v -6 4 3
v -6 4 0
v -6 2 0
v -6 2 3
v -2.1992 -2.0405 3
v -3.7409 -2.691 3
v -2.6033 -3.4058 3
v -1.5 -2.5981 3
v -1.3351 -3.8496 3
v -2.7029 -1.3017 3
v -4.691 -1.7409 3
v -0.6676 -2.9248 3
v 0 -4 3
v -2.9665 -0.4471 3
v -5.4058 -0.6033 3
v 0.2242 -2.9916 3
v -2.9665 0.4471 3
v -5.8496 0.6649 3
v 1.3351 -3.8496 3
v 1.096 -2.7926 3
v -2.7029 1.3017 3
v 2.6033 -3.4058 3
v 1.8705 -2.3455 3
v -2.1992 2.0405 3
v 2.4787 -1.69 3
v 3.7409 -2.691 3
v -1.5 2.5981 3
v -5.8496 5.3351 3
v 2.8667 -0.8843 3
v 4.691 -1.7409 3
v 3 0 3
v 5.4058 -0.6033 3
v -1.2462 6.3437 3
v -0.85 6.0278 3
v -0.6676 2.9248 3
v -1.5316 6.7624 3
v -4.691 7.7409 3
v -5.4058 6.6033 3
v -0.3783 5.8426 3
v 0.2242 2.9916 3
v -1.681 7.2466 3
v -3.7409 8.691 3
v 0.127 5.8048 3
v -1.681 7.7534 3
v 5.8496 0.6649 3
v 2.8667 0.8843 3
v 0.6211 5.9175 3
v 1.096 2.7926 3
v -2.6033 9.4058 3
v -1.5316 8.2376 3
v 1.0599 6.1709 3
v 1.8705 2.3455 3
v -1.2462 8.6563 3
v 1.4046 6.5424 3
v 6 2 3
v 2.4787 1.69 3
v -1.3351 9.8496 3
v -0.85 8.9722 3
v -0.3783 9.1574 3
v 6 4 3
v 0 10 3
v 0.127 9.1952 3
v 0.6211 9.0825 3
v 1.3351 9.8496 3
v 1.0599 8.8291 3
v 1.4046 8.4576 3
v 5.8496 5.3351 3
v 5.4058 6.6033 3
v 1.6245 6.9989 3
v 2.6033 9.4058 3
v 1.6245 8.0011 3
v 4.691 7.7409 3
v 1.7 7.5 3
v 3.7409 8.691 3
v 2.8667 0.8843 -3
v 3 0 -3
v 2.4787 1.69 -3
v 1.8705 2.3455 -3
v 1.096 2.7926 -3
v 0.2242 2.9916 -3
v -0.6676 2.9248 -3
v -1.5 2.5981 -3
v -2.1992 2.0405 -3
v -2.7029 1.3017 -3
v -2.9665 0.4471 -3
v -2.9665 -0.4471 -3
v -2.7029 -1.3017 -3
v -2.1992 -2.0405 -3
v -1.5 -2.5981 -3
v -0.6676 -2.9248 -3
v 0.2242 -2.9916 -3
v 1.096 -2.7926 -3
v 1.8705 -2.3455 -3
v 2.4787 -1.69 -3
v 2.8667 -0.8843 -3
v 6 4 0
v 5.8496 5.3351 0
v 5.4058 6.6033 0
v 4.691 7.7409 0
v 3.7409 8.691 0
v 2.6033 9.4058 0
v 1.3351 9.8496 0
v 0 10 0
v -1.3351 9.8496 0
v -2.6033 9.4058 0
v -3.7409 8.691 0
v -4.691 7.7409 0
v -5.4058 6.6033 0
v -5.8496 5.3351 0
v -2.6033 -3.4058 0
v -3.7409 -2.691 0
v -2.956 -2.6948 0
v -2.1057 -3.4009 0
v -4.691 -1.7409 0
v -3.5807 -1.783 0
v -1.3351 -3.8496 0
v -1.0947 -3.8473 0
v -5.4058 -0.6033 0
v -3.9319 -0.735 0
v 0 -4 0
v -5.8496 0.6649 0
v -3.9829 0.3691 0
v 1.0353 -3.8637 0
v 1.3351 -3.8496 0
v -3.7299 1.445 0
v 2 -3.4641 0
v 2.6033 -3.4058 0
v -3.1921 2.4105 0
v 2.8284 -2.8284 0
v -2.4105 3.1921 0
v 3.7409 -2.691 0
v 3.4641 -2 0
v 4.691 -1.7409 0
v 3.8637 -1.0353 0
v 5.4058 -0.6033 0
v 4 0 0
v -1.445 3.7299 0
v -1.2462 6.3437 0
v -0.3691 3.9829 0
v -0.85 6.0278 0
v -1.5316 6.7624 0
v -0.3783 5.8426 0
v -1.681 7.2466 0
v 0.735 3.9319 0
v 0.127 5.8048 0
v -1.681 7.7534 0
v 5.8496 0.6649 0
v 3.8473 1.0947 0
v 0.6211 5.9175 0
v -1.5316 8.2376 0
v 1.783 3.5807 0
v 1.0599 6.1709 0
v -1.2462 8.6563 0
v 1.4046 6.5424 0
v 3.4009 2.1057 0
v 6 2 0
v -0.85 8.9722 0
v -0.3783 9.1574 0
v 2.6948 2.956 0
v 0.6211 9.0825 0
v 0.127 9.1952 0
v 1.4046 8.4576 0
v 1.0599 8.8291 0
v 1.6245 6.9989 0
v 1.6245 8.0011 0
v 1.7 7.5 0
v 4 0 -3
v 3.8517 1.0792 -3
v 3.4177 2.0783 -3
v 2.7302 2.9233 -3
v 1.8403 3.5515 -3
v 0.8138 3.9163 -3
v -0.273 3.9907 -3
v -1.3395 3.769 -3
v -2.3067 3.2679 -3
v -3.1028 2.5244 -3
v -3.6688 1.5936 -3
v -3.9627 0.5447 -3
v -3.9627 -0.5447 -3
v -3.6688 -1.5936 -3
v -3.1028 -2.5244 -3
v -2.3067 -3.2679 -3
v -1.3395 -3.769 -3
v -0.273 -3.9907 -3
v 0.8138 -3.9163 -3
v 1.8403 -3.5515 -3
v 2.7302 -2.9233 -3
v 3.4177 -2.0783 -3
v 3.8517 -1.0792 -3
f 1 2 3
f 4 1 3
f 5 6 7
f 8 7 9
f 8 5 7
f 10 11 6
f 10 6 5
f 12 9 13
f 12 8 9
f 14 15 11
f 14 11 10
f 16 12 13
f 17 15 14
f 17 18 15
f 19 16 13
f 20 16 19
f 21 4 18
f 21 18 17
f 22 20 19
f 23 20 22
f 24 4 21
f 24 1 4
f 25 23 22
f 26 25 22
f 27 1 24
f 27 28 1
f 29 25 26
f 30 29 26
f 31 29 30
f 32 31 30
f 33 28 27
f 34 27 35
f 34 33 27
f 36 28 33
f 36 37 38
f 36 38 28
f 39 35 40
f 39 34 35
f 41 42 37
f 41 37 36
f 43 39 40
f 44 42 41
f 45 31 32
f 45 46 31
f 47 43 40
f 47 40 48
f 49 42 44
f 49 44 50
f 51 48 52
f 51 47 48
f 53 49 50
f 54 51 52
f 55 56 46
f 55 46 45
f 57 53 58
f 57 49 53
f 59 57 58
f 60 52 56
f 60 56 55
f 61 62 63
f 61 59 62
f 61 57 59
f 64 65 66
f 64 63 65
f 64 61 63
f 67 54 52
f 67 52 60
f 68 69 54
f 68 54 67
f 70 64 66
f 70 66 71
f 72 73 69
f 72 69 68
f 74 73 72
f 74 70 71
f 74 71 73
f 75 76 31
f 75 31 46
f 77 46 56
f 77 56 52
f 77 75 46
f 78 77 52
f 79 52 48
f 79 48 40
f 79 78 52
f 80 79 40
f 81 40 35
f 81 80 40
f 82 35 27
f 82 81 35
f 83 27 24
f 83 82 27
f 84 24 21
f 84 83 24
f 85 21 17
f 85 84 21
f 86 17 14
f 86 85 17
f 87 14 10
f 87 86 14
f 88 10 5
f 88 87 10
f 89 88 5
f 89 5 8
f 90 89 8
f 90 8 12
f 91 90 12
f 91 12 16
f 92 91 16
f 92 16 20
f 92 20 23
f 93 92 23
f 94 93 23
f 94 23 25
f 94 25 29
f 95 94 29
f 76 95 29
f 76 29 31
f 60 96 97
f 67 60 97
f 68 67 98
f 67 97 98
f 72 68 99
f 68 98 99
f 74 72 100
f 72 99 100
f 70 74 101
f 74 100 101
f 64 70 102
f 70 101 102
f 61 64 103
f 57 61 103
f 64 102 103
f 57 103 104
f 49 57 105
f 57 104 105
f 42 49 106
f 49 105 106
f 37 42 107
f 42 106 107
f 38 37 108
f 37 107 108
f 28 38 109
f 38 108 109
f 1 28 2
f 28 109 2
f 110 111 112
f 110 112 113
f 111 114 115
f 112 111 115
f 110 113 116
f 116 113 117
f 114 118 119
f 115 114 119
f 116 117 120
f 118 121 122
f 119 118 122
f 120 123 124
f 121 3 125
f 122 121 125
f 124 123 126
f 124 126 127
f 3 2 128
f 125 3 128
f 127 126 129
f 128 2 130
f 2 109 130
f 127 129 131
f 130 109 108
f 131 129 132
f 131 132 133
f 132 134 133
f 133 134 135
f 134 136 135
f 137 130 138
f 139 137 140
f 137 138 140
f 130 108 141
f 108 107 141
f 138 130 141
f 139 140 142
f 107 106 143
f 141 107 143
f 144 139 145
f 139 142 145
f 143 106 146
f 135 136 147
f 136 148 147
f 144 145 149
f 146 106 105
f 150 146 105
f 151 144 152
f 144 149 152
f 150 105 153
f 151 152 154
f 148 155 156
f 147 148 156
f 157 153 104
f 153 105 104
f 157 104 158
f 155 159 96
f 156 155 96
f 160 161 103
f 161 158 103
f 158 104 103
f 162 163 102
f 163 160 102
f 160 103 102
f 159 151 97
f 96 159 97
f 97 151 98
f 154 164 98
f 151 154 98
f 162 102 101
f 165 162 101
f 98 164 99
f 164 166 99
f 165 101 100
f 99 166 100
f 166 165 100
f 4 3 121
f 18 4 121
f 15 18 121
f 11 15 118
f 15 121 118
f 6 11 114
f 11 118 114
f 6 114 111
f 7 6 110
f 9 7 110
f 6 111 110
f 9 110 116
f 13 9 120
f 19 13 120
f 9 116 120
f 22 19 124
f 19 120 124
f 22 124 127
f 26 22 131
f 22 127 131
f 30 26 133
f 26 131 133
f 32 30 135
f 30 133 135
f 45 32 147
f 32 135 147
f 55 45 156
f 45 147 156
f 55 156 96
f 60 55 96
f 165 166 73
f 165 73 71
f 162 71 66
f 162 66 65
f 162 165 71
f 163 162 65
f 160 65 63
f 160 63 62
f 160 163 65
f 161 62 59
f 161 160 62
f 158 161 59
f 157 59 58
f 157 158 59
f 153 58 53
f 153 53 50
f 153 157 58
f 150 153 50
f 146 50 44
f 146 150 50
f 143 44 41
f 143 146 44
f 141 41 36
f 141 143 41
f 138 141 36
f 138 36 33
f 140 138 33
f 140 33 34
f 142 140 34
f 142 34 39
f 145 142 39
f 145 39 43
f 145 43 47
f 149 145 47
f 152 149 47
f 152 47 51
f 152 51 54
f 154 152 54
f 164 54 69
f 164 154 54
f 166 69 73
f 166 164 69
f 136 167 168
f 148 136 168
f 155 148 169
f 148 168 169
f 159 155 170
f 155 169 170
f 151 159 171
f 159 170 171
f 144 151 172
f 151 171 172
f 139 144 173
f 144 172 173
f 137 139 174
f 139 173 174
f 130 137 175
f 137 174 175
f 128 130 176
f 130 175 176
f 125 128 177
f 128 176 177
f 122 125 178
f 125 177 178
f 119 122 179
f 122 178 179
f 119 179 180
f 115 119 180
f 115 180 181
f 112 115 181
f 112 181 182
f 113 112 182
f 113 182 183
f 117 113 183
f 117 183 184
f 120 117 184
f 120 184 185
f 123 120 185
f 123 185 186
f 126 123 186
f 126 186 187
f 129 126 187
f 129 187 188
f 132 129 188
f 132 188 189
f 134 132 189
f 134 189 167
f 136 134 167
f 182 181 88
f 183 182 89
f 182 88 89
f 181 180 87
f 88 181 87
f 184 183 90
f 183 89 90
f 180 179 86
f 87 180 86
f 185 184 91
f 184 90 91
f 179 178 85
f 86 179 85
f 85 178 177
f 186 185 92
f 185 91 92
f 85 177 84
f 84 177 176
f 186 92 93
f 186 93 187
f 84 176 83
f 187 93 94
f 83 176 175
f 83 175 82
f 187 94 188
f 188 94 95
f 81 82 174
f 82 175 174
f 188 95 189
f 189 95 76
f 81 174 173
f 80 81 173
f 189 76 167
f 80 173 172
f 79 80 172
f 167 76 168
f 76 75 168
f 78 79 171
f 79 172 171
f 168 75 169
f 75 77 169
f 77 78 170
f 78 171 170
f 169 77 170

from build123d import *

# Parameters (mm, degrees)
SKETCH1_R           = 1.7
SKETCH1_R_2         = 3
BOSS_EXTRUDE1_DEPTH = 3
BOSS_EXTRUDE2_START = -3
SKETCH1_3_R         = 4
SKETCH1_3_R_2       = 3
BOSS_EXTRUDE2_DEPTH = 3


with BuildPart() as part:
    # Sketch1 → Boss-Extrude1 (new body)
    with BuildSketch(Plane.XY):
        with BuildLine():
            Line((-6, 4), (-6, 2))
            ThreePointArc((-6, 2), (0, -4), (6, 2))
            Line((6, 2), (6, 4))
            ThreePointArc((6, 4), (0, 10), (-6, 4))
        make_face()
        with Locations((0, 7.5)):
            Circle(SKETCH1_R, mode=Mode.SUBTRACT)
        Circle(SKETCH1_R_2, mode=Mode.SUBTRACT)
    extrude(amount=BOSS_EXTRUDE1_DEPTH)

    # Sketch1<3> → Boss-Extrude2 (add)
    with BuildSketch(Plane.XY.offset(BOSS_EXTRUDE2_START)):
        Circle(SKETCH1_3_R)
        Circle(SKETCH1_3_R_2, mode=Mode.SUBTRACT)
    extrude(amount=BOSS_EXTRUDE2_DEPTH)


solid = part.part
